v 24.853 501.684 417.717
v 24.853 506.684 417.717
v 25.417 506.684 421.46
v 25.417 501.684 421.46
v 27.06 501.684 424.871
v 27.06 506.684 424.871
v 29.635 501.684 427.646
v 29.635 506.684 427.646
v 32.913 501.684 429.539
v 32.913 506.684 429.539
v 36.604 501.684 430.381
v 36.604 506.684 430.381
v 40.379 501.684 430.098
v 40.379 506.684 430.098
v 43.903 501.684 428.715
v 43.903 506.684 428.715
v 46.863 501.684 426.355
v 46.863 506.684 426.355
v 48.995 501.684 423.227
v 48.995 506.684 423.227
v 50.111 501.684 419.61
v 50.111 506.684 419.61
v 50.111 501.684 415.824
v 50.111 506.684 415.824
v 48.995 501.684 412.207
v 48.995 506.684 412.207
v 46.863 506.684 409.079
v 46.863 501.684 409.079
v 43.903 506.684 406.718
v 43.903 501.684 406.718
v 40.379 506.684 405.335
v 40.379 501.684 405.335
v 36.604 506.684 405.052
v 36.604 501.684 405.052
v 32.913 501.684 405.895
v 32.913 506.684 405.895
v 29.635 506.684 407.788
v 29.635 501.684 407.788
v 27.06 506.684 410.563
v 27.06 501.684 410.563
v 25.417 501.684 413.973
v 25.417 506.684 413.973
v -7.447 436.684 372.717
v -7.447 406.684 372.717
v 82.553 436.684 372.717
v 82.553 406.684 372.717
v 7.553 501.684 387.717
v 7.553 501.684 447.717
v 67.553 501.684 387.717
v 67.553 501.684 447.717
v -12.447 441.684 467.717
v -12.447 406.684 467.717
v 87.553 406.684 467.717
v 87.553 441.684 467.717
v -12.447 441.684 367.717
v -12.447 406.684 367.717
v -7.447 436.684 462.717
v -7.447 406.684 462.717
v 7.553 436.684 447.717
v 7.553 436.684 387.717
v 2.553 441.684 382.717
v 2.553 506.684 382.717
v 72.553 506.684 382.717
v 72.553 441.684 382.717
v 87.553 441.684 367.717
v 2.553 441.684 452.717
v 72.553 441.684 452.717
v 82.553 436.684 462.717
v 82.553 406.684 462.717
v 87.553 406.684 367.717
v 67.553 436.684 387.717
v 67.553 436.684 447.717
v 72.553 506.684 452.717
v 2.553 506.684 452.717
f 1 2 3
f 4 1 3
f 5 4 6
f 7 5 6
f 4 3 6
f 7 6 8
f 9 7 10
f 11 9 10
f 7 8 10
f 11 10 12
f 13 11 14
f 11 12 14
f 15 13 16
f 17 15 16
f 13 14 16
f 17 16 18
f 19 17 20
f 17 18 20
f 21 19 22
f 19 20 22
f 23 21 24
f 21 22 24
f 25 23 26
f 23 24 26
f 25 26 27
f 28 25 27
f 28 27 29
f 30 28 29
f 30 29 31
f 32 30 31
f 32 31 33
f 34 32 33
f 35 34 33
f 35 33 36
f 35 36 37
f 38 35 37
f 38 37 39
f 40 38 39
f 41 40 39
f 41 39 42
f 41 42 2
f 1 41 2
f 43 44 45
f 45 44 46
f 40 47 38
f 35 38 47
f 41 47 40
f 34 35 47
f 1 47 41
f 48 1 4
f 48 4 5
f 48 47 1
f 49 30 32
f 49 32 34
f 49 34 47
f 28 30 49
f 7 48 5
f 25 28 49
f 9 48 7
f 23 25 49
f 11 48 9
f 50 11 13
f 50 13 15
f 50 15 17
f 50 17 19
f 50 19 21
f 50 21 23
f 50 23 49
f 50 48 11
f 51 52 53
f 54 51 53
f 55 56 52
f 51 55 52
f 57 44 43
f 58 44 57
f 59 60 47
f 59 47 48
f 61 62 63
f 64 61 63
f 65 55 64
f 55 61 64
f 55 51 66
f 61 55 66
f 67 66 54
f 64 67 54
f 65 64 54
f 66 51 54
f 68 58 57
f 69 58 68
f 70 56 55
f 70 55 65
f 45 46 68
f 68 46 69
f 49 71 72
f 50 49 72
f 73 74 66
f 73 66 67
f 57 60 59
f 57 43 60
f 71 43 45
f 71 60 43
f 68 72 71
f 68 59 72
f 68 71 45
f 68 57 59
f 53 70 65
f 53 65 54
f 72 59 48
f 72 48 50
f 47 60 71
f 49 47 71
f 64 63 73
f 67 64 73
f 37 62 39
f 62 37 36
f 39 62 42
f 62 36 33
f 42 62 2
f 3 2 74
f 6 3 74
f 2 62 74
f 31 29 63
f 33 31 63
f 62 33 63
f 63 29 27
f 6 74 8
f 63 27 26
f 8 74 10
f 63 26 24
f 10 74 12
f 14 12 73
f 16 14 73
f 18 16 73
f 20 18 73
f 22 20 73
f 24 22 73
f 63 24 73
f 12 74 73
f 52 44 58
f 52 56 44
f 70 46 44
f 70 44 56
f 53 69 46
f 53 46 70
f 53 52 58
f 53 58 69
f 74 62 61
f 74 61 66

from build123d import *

# Parameters (mm, degrees)
F10_W     = 100
F10_H     = 100
F14_DEPTH = 35
F13_W     = 70
F13_H     = 70
F15_DEPTH = 65
F16_T     = -5
F21_D     = 25.4


# Not quite as in the source:
# - the program builds the solid bodies; features that only make, move or delete a surface that nothing else refers to are left out


with BuildPart() as f14:
    # F10 (on offset) → F14 (new body, through all)
    with BuildSketch(Plane.XZ.offset(-406.68448)):
        with Locations((37.5531539321, 417.7168309689)):
            Rectangle(F10_W, F10_H)
    extrude(amount=-F14_DEPTH)

    # F13 (on offset) → F15 (join, through all)
    with BuildSketch(Plane.XZ.offset(-506.68448)):
        with Locations((37.5531539321, 417.7168309689)):
            Rectangle(F13_W, F13_H)
    extrude(amount=F15_DEPTH)

    # F16
    f16_openings = [f14.faces().sort_by_distance(p)[0] for p in [
        (37.553154, 406.68448, 417.716831),
    ]]
    offset(amount=F16_T, openings=f16_openings, kind=Kind.INTERSECTION)

    # F21 (through all)
    with Locations(Plane.XZ.offset(-441.68448)):
        with Locations((37.5531539321, 417.7168309689)):
            Hole(F21_D / 2)


solid = f14.part
